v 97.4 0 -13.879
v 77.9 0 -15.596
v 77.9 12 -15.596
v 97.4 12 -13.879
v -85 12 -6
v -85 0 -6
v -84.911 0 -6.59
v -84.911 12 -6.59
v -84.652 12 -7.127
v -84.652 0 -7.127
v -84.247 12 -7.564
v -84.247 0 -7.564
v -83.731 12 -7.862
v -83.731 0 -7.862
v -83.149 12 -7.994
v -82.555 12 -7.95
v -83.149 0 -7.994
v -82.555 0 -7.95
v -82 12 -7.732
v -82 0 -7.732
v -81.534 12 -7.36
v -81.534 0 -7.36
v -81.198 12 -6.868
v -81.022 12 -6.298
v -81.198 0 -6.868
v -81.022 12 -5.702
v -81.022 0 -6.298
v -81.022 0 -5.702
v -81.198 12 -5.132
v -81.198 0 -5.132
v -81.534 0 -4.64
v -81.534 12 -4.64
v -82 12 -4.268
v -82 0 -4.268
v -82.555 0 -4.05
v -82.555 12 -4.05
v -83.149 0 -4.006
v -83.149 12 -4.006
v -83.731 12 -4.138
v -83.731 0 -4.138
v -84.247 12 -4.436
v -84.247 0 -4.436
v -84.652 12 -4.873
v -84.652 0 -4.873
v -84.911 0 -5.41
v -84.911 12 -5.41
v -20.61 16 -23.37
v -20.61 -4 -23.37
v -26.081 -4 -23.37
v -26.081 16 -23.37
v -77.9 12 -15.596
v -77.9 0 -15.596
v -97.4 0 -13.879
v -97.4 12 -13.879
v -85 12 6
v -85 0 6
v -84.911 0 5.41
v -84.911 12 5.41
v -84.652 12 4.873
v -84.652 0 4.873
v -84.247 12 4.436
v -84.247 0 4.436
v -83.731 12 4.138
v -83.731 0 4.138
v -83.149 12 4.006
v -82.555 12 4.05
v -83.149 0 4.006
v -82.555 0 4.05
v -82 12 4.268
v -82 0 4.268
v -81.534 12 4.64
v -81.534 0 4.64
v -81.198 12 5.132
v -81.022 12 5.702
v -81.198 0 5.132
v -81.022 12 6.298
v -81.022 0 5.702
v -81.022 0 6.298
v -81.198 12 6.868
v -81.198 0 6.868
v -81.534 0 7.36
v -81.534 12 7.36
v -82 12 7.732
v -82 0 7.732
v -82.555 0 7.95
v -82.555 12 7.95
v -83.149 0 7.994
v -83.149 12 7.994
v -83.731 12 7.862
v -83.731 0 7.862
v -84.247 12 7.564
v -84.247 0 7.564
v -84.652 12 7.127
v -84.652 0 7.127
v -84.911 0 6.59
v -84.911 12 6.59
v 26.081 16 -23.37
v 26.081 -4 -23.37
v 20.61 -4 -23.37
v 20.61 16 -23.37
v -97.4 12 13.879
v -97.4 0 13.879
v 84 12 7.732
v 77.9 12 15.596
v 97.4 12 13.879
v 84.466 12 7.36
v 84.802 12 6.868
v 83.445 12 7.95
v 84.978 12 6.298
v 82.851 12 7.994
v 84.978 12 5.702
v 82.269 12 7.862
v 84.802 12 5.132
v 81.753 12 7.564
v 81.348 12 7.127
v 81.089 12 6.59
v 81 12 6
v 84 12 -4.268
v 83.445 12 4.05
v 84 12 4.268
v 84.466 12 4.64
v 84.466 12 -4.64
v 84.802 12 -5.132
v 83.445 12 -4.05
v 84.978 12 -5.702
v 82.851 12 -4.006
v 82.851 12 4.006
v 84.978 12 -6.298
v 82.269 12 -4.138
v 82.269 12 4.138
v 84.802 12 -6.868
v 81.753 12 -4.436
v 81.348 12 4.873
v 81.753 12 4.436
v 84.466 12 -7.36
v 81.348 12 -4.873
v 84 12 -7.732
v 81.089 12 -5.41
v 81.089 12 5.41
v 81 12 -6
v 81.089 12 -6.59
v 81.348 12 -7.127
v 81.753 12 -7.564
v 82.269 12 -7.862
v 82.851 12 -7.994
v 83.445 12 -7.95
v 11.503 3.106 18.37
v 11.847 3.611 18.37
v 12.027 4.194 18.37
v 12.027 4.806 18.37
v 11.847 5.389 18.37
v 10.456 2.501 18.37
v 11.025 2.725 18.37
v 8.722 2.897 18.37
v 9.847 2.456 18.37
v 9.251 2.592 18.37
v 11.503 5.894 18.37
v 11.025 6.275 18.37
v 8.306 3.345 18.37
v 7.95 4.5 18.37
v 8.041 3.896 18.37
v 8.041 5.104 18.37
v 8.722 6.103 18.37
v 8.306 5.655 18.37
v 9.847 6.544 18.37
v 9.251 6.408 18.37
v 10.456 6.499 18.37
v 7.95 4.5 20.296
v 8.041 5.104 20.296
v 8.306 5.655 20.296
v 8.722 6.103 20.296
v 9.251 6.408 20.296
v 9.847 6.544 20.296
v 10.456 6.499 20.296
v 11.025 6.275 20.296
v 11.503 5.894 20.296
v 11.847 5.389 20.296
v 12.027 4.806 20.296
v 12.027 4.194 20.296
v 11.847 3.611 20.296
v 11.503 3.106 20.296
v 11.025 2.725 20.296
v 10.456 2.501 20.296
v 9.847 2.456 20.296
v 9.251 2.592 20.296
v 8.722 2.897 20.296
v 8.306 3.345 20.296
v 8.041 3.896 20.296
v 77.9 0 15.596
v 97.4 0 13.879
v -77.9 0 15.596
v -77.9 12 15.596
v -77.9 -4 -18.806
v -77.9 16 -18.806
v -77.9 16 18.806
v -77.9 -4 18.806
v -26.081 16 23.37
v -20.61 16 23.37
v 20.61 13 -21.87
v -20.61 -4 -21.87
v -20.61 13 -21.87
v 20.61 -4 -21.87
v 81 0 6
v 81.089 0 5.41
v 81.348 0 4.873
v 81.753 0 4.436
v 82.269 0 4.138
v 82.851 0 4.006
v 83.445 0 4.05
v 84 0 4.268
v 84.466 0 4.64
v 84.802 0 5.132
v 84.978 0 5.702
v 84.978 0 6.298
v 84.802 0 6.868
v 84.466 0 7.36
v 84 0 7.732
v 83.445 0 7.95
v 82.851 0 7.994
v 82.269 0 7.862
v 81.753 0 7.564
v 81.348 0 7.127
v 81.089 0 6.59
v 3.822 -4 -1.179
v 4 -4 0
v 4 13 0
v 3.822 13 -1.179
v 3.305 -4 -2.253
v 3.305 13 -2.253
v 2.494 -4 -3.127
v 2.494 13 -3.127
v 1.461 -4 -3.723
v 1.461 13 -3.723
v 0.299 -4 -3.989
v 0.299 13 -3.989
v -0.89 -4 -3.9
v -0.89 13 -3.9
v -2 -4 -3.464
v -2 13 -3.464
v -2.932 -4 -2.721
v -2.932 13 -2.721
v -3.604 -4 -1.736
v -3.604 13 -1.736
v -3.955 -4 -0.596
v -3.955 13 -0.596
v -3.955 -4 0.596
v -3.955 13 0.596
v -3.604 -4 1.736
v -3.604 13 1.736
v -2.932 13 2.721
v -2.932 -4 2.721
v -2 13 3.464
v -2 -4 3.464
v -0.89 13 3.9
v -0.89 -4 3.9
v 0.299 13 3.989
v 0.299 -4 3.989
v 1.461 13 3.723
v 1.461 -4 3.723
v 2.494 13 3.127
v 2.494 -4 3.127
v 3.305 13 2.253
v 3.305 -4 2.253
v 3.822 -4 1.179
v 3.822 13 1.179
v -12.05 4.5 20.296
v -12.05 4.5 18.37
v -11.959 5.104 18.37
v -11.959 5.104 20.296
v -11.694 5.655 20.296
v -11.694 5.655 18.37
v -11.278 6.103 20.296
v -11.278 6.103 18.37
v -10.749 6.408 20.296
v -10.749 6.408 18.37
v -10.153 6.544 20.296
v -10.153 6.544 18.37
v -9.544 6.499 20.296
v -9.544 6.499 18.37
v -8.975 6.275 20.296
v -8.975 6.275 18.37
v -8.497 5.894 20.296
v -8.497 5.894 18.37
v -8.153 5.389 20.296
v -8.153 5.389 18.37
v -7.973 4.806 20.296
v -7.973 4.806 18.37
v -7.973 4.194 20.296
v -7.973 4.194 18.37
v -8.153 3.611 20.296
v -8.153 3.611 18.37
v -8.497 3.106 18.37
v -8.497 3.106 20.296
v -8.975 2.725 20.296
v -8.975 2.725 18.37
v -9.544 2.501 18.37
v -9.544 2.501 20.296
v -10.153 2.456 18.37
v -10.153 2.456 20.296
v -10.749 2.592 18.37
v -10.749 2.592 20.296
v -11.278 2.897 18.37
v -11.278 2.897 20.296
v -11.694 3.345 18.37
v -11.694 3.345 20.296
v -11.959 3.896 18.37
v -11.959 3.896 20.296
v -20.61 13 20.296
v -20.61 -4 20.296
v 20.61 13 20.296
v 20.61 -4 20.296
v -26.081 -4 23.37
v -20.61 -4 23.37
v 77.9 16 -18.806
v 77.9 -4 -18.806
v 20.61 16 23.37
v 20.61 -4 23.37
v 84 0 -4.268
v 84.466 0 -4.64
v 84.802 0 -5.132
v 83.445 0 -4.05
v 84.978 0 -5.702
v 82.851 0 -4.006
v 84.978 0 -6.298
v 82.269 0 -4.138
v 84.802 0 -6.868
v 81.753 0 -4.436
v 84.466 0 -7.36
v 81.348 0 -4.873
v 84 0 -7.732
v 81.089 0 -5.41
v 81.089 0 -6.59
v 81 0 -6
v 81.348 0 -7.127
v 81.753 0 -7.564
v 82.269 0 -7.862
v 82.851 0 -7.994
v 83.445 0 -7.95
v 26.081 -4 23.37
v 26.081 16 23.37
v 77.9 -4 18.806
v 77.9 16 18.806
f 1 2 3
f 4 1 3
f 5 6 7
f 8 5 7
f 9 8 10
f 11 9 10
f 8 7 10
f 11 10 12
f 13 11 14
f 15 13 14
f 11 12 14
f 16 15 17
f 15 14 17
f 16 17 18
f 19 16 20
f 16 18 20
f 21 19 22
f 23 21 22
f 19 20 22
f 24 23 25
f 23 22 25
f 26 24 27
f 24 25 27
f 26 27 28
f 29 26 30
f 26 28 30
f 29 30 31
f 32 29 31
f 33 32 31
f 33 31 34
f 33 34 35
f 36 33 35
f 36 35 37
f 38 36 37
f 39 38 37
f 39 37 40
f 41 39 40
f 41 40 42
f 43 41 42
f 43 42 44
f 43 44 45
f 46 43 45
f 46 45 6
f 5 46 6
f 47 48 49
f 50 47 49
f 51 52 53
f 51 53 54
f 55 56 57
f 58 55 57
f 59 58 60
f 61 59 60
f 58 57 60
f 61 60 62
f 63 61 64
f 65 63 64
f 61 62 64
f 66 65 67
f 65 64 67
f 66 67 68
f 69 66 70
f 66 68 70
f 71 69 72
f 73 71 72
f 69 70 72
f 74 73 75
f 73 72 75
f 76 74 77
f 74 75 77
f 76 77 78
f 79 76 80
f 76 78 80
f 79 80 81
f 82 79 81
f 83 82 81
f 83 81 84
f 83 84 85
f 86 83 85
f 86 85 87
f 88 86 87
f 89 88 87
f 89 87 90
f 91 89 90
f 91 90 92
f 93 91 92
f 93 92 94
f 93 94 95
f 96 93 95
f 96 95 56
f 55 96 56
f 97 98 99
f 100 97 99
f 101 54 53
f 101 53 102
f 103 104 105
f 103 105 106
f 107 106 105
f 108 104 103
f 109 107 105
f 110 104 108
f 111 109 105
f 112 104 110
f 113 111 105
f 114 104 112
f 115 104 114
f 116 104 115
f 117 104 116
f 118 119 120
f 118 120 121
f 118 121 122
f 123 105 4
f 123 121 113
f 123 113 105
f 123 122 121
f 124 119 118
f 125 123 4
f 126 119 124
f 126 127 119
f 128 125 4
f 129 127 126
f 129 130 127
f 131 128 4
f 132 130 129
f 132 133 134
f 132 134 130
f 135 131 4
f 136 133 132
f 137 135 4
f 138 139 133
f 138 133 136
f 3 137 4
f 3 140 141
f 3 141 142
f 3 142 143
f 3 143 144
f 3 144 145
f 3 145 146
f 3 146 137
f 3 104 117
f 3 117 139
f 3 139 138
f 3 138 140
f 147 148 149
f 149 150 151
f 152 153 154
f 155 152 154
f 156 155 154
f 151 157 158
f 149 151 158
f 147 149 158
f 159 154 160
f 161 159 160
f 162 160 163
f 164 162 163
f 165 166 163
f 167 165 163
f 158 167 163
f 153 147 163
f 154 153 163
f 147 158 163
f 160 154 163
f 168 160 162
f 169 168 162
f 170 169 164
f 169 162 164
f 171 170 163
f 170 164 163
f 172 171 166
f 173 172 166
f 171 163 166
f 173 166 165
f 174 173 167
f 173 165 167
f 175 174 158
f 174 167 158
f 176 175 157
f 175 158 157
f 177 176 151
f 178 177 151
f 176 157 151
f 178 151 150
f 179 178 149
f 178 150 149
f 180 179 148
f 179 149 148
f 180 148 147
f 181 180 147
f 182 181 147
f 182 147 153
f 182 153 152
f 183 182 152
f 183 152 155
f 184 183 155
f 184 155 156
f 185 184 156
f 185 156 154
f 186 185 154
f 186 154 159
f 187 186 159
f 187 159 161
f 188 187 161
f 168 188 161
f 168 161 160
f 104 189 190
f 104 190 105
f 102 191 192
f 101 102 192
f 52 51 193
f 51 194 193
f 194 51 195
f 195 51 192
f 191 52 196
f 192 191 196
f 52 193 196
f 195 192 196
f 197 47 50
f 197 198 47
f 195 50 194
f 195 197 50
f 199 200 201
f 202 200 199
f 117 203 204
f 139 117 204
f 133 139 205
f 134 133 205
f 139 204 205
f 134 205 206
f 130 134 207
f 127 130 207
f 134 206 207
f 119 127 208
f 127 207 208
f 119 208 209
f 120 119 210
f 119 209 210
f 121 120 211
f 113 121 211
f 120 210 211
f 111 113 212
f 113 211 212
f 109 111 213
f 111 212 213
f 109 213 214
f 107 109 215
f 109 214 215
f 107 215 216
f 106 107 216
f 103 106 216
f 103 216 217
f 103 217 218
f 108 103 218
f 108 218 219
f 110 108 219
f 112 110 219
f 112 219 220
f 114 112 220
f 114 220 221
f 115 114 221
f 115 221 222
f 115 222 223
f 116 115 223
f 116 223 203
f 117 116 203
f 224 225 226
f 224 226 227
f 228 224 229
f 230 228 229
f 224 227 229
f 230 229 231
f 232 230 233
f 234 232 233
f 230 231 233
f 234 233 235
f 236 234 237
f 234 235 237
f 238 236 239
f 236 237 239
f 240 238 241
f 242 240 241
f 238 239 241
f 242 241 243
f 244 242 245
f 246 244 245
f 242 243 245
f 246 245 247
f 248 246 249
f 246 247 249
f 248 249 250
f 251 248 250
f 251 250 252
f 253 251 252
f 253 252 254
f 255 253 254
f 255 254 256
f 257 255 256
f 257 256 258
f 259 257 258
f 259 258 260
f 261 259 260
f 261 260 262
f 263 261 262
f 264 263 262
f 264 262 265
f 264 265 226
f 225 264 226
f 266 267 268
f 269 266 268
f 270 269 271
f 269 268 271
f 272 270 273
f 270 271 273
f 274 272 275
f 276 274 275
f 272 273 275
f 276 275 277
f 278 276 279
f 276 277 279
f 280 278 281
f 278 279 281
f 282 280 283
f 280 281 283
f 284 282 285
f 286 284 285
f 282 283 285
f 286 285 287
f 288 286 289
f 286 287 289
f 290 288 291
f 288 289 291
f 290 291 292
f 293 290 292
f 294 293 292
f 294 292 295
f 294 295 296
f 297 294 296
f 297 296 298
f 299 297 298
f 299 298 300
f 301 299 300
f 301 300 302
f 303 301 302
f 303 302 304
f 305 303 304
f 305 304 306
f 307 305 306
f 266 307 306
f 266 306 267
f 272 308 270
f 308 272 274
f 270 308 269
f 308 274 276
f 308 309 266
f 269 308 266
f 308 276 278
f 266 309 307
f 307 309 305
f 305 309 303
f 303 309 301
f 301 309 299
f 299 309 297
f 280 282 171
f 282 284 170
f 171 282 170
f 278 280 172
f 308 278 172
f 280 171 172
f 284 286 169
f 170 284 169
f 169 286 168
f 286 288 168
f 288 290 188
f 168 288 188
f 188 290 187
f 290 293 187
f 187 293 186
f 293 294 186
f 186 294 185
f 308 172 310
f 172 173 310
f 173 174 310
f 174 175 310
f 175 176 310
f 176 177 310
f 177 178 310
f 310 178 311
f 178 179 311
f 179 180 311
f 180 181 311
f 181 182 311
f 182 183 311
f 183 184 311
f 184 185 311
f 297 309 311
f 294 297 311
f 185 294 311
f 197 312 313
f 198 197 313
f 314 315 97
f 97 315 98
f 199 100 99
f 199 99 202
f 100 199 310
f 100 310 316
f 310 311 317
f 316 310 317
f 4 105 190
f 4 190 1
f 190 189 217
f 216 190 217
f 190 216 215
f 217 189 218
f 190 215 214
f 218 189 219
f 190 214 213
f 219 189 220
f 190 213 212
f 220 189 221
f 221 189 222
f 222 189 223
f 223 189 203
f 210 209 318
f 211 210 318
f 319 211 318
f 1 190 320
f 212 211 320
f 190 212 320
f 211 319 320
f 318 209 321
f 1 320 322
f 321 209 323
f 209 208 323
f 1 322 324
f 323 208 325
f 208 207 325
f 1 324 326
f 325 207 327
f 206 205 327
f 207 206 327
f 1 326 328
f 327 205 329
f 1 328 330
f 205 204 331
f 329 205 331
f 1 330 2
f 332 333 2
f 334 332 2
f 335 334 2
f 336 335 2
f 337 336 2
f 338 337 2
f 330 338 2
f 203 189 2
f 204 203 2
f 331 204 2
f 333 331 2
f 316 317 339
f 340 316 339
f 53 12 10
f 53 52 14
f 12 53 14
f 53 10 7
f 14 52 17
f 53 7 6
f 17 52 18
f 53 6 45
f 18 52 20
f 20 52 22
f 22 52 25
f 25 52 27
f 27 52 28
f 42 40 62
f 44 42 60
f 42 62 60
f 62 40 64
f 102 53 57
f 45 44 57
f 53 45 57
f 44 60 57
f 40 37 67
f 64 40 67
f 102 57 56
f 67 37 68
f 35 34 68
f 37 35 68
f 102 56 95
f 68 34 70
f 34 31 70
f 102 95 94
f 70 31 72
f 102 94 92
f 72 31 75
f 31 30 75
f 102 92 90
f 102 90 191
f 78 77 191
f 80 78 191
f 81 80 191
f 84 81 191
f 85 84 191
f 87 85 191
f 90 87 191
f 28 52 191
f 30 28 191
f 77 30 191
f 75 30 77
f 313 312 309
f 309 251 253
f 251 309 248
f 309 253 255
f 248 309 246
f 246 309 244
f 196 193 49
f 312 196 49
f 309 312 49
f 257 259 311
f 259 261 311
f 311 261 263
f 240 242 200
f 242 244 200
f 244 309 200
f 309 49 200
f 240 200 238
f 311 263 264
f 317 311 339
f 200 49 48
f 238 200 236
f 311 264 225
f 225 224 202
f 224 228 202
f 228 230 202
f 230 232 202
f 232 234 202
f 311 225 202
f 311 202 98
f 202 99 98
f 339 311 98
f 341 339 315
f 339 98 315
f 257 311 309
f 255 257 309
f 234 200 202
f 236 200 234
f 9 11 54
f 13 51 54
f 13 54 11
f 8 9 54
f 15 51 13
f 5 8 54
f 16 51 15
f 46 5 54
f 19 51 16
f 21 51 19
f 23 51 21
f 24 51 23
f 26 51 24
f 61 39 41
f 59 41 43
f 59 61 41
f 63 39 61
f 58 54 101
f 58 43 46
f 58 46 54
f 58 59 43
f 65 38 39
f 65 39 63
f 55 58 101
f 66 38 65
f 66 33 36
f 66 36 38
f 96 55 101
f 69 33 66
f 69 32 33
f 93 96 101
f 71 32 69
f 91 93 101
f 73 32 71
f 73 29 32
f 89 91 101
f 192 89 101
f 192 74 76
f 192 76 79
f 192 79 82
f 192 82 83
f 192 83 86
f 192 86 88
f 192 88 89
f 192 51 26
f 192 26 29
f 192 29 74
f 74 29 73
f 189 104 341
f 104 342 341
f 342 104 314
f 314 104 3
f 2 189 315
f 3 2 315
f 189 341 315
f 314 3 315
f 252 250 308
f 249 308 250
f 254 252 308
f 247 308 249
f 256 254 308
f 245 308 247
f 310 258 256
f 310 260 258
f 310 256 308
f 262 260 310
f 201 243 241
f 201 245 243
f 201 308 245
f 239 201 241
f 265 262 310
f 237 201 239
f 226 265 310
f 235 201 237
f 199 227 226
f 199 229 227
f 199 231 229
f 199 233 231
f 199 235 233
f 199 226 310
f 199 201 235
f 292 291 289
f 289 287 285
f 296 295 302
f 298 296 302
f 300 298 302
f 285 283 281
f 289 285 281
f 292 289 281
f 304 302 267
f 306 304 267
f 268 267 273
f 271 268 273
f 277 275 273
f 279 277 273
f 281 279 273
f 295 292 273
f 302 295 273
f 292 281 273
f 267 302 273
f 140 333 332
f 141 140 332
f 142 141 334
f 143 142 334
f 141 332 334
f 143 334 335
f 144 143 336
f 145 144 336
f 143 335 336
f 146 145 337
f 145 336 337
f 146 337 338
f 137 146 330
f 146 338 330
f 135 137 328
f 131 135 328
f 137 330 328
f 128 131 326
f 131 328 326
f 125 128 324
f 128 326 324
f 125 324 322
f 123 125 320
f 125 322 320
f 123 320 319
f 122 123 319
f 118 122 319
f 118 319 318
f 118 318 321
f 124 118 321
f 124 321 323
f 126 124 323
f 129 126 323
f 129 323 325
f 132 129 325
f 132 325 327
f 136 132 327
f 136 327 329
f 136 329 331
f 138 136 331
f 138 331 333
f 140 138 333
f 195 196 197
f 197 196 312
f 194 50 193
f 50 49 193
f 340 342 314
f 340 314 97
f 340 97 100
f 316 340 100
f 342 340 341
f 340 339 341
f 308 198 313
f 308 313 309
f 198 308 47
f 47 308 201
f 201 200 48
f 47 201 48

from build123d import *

# Parameters (mm, degrees)
BOSS_EXTRUDE1_DEPTH            = 17
SKETCH2_W                      = 41.219755562
SKETCH2_H                      = 3.074219812
CUT_EXTRUDE1_DEPTH             = 84.08770607
SKETCH3_W                      = 41.219755562
SKETCH3_H                      = 1.5
CUT_EXTRUDE2_DEPTH             = 84.08770607
BOSS_EXTRUDE2_DEPTH            = 3
BOSS_EXTRUDE3_DEPTH            = 3
SKETCH6_W                      = 31.19276455
SKETCH6_H                      = 12
BOSS_EXTRUDE4_DEPTH            = 19.5
SKETCH7_W                      = 31.19276455
SKETCH7_H                      = 12
BOSS_EXTRUDE5_DEPTH            = 19.5
DRAFT1_ANGLE                   = 5.033187306
DRAFT2_ANGLE                   = 5.033187306
F_4_1_4_1_DIAMETER_HOLE1_D     = 4.1
F_4_1_4_1_DIAMETER_HOLE1_DEPTH = 5
F_4_0_4_DIAMETER_HOLE1_D       = 4
F_4_0_4_DIAMETER_HOLE1_DEPTH   = 16
F_8_0_8_DIAMETER_HOLE1_D       = 8
F_8_0_8_DIAMETER_HOLE1_DEPTH   = 20


with BuildPart() as part:
    # Sketch1 → Boss-Extrude1 (new body)
    with BuildSketch(Plane(origin=(0, 13, 0), x_dir=(1, 0, 0), z_dir=(0, 1, 0))):
        Polygon((-26.080793056, -23.37), (26.080793056, -23.37), (77.9, -18.806160436), (77.9, 18.806160436), (26.080793056, 23.37), (-26.080793056, 23.37), (-77.9, 18.806160436), (-77.9, -18.806160436), align=None)
    extrude(amount=-BOSS_EXTRUDE1_DEPTH)

    # Sketch2 → Cut-Extrude1 (cut, through all)
    with BuildSketch(Plane.XZ.offset(4)):
        with Locations((0, 21.832890094)):
            Rectangle(SKETCH2_W, SKETCH2_H)
    extrude(amount=-CUT_EXTRUDE1_DEPTH, mode=Mode.SUBTRACT)

    # Sketch3 → Cut-Extrude2 (cut, through all)
    with BuildSketch(Plane.XZ.offset(4)):
        with Locations((0, -22.62)):
            Rectangle(SKETCH3_W, SKETCH3_H)
    extrude(amount=-CUT_EXTRUDE2_DEPTH, mode=Mode.SUBTRACT)

    # Sketch4 → Boss-Extrude2 (add)
    with BuildSketch(Plane(origin=(0, 13, 0), x_dir=(-1, 0, 0), z_dir=(0, 1, 0))):
        Polygon((-20.609877781, 20.295780188), (-20.609877781, 23.37), (-26.080793056, 23.37), (-77.9, 18.806160436), (-77.9, -18.806160436), (-26.080793056, -23.37), (-20.609877781, -23.37), (-20.609877781, -21.87), align=None)
    extrude(amount=BOSS_EXTRUDE2_DEPTH)

    # Sketch5 → Boss-Extrude3 (add)
    with BuildSketch(Plane(origin=(0, 13, 0), x_dir=(-1, 0, 0), z_dir=(0, 1, 0))):
        Polygon((20.609877781, -21.87), (20.609877781, -23.37), (26.080793056, -23.37), (77.9, -18.806160436), (77.9, 18.806160436), (26.080793056, 23.37), (20.609877781, 23.37), (20.609877781, 20.295780188), align=None)
    extrude(amount=BOSS_EXTRUDE3_DEPTH)

    # Sketch6 → Boss-Extrude4 (add)
    with BuildSketch(Plane(origin=(77.9, 0, 0), x_dir=(0, 0, -1), z_dir=(1, 0, 0))):
        with Locations((0, 6)):
            Rectangle(SKETCH6_W, SKETCH6_H)
    extrude(amount=BOSS_EXTRUDE4_DEPTH)

    # Sketch7 → Boss-Extrude5 (add)
    with BuildSketch(Plane.ZY.offset(77.9)):
        with Locations((0, 6)):
            Rectangle(SKETCH7_W, SKETCH7_H)
    extrude(amount=BOSS_EXTRUDE5_DEPTH)

    # Draft1
    draft1_faces = [part.faces().sort_by_distance(p)[0] for p in [
        (-87.65, 6, 15.596382275),
        (-87.65, 6, -15.596382275),
    ]]
    draft(draft1_faces, Plane(origin=(-77.9, -4, -18.806160436), x_dir=(0, 0, -1), z_dir=(-1, 0, 0)), DRAFT1_ANGLE)

    # Draft2
    draft2_faces = [part.faces().sort_by_distance(p)[0] for p in [
        (87.65, 6, 15.596382275),
        (87.65, 6, -15.596382275),
    ]]
    draft(draft2_faces, Plane(origin=(77.9, -4, 18.806160436), x_dir=(0, 0, 1), z_dir=(1, 0, 0)), DRAFT2_ANGLE)

    # Ø4.1 (4.1) Diameter Hole1
    with Locations(Plane.XY.offset(23.37)):
        with Locations((-10, 4.5), (10, 4.5)):
            Hole(F_4_1_4_1_DIAMETER_HOLE1_D / 2, depth=F_4_1_4_1_DIAMETER_HOLE1_DEPTH)

    # Ø4.0 (4) Diameter Hole1
    with Locations(Plane(origin=(0, 12, 0), x_dir=(1, 0, 0), z_dir=(0, 1, 0))):
        with Locations((-83, 6), (-83, -6), (83, -6), (83, 6)):
            Hole(F_4_0_4_DIAMETER_HOLE1_D / 2, depth=F_4_0_4_DIAMETER_HOLE1_DEPTH)

    # Ø8.0 (8) Diameter Hole1
    with Locations(Plane(origin=(0, -4, 0), x_dir=(-1, 0, 0), z_dir=(0, -1, 0))):
        with Locations((0, 0)):
            Hole(F_8_0_8_DIAMETER_HOLE1_D / 2, depth=F_8_0_8_DIAMETER_HOLE1_DEPTH)


solid = part.part
